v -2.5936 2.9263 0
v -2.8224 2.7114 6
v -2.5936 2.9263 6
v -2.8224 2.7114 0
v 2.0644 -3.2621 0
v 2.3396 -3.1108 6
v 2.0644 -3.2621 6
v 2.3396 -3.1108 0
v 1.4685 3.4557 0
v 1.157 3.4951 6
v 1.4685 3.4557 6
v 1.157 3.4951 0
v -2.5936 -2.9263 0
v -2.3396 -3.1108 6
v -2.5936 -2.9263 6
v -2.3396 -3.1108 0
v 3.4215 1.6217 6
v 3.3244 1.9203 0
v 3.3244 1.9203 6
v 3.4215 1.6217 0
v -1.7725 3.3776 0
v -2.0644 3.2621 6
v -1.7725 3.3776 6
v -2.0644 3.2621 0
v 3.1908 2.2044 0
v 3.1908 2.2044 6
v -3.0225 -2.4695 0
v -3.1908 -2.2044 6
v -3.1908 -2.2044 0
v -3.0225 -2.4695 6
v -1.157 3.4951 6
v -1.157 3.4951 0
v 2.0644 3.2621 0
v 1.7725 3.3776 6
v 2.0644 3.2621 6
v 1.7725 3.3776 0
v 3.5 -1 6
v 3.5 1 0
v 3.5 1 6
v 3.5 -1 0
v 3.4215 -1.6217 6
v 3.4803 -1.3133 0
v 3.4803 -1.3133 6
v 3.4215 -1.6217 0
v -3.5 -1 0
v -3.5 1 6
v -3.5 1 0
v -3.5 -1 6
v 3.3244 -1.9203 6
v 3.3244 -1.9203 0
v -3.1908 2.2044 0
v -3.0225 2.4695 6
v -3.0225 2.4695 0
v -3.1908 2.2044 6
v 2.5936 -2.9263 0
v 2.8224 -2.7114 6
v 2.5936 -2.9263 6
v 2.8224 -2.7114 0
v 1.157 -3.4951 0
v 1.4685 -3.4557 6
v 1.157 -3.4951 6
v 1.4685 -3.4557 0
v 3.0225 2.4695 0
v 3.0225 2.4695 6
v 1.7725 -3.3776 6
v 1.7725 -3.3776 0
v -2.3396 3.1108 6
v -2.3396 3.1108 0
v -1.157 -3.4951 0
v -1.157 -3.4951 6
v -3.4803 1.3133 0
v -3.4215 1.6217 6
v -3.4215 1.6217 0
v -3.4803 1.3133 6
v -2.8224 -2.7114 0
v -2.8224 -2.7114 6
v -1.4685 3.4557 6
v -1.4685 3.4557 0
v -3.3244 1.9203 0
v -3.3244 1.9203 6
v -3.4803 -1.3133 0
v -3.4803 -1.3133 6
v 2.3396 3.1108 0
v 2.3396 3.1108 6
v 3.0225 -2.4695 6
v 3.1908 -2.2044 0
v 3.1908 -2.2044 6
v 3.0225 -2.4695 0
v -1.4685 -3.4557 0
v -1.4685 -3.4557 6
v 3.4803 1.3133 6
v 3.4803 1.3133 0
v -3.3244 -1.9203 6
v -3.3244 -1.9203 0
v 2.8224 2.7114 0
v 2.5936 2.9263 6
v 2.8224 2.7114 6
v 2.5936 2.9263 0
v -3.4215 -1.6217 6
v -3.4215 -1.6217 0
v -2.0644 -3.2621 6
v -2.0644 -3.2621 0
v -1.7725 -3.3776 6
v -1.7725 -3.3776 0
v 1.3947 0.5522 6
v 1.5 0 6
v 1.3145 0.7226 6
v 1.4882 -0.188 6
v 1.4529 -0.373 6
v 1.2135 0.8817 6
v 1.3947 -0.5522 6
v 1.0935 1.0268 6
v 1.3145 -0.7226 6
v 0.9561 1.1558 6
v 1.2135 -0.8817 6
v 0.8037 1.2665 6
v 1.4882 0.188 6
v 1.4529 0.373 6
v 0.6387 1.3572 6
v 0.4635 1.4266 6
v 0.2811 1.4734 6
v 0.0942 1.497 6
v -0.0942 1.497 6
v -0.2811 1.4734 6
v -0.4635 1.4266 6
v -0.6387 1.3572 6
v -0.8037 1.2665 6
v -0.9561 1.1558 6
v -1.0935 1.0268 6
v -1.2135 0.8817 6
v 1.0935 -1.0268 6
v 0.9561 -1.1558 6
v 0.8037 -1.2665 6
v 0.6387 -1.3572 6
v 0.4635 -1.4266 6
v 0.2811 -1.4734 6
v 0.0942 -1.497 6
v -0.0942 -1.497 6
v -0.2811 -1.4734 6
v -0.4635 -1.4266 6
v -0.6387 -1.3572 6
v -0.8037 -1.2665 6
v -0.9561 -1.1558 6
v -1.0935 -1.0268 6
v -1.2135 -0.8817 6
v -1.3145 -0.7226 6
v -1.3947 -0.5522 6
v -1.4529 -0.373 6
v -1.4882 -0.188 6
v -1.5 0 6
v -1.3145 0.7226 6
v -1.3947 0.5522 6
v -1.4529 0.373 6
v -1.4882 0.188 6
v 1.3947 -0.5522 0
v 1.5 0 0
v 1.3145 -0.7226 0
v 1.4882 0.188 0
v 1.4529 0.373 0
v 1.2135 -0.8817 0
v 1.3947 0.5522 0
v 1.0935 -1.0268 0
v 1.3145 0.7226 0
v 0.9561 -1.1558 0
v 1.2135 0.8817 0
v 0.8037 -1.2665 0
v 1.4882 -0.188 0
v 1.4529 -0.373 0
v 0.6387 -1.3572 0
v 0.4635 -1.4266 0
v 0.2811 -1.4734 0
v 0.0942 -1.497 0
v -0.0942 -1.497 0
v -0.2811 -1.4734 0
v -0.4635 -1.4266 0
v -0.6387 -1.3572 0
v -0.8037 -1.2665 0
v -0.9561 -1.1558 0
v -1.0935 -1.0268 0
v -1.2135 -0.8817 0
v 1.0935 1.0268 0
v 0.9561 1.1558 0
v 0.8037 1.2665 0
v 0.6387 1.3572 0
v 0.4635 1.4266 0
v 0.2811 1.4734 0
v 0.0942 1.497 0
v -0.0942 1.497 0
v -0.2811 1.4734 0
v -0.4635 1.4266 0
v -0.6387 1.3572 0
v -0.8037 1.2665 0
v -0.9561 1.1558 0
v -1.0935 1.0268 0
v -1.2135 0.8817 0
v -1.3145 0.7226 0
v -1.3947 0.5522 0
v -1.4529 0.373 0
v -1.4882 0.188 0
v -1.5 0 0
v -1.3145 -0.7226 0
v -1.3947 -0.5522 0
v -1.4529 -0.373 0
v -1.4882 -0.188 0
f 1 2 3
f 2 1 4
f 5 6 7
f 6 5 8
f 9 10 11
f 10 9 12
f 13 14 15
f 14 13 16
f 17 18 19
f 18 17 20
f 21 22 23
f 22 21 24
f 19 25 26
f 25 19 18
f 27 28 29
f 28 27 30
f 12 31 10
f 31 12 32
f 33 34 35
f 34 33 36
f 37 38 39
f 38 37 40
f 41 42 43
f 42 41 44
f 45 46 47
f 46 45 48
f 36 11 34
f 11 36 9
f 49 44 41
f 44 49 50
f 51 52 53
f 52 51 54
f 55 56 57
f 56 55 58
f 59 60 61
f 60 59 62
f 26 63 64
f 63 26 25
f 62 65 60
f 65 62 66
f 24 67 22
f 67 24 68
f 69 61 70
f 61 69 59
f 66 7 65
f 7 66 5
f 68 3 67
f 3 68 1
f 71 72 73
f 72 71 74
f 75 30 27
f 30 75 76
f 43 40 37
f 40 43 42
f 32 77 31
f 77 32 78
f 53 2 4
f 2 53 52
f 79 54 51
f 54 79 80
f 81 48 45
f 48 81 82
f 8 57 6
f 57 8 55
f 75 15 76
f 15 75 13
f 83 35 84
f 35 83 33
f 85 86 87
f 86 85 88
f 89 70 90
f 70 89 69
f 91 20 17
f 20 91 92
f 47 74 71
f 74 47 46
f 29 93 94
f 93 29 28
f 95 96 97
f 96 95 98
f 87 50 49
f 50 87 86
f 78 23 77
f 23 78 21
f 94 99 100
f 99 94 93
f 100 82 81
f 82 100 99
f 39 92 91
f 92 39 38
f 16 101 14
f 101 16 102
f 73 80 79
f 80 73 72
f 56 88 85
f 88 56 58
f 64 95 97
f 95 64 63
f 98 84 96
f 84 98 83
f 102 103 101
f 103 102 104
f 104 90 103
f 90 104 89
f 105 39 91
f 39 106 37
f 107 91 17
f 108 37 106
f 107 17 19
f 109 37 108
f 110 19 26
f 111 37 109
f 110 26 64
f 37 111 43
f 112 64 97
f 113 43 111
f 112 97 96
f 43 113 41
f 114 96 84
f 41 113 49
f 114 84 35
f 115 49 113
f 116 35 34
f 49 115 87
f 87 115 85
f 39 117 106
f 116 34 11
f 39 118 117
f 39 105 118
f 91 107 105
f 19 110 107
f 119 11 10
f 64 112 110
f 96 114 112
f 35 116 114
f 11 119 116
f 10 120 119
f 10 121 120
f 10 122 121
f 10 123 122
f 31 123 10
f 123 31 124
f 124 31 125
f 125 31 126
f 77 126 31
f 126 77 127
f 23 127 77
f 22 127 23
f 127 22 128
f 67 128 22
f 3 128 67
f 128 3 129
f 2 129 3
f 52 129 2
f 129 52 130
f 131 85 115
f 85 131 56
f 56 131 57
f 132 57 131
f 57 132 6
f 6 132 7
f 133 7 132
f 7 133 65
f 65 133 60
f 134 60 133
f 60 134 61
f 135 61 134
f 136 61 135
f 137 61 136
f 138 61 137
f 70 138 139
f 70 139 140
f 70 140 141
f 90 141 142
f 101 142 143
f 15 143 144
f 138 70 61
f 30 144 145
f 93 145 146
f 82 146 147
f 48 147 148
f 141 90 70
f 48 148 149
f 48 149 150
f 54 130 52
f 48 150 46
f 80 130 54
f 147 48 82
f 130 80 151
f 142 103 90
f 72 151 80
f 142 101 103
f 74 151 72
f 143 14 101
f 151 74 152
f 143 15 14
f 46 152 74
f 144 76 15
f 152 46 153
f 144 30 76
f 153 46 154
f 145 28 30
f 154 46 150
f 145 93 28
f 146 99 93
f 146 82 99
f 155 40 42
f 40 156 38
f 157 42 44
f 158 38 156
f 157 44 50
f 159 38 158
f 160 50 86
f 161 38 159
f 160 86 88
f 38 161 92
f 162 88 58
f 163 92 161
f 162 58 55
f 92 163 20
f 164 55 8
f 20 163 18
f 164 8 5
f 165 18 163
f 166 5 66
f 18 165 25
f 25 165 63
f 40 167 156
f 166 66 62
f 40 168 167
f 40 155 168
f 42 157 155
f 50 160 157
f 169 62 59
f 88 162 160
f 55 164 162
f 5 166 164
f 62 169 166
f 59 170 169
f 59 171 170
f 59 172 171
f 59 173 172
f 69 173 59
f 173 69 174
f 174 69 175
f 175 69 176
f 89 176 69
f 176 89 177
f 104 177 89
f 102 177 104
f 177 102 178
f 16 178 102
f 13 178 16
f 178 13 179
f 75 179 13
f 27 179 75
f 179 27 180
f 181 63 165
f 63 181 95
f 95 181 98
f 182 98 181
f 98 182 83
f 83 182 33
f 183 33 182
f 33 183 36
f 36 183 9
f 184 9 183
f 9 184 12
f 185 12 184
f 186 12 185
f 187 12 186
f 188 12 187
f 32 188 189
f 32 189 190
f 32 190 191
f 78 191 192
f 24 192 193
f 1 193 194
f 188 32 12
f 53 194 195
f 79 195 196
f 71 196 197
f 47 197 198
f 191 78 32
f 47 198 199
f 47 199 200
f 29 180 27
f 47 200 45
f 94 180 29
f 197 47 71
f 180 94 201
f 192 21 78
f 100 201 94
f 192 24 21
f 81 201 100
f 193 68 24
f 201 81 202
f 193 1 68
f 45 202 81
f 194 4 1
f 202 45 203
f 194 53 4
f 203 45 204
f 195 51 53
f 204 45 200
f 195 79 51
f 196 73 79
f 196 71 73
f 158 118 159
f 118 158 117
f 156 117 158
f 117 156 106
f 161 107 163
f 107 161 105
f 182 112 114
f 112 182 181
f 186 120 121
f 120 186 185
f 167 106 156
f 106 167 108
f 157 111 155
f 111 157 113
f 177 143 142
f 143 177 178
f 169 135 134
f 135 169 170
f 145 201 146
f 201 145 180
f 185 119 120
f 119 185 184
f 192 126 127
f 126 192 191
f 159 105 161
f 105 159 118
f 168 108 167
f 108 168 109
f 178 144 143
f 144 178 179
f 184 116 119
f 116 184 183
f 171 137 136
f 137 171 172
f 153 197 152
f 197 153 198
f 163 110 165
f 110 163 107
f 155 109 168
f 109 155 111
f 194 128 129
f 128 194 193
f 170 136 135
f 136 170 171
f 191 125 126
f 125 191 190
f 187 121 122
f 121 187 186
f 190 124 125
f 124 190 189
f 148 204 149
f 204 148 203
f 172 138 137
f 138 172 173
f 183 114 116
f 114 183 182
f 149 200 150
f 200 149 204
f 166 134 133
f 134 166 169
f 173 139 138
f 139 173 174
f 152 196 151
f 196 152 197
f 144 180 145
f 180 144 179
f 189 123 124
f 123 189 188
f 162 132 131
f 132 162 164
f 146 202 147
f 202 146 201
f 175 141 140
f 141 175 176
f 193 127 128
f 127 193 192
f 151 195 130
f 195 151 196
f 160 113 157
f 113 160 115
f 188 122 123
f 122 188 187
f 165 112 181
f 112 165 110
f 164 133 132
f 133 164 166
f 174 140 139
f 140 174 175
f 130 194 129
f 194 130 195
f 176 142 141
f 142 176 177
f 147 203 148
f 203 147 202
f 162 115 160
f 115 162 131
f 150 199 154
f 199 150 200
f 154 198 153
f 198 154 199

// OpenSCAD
$fn = 50;


difference() {
	union() {
		translate(v = [0, 0, 0]) {
			rotate(a = [0, 0, 0]) {
				hull() {
					translate(v = [-1.0000000000, 1.0000000000, 0]) {
						rotate(a = [0, 0, 0]) {
							translate(v = [0, 0, 0]) {
								rotate(a = [0, 0, 0]) {
									cylinder(h = 6, r = 2.5000000000);
								}
							}
						}
					}
					translate(v = [1.0000000000, 1.0000000000, 0]) {
						rotate(a = [0, 0, 0]) {
							translate(v = [0, 0, 0]) {
								rotate(a = [0, 0, 0]) {
									cylinder(h = 6, r = 2.5000000000);
								}
							}
						}
					}
					translate(v = [-1.0000000000, -1.0000000000, 0]) {
						rotate(a = [0, 0, 0]) {
							translate(v = [0, 0, 0]) {
								rotate(a = [0, 0, 0]) {
									cylinder(h = 6, r = 2.5000000000);
								}
							}
						}
					}
					translate(v = [1.0000000000, -1.0000000000, 0]) {
						rotate(a = [0, 0, 0]) {
							translate(v = [0, 0, 0]) {
								rotate(a = [0, 0, 0]) {
									cylinder(h = 6, r = 2.5000000000);
								}
							}
						}
					}
				}
			}
		}
	}
	union() {
		translate(v = [0.0000000000, 0.0000000000, 0]) {
			rotate(a = [0, 0, 0]) {
				translate(v = [0, 0, -50]) {
					rotate(a = [0, 0, 0]) {
						cylinder(h = 100, r = 1.5000000000);
					}
				}
			}
		}
	}
}
